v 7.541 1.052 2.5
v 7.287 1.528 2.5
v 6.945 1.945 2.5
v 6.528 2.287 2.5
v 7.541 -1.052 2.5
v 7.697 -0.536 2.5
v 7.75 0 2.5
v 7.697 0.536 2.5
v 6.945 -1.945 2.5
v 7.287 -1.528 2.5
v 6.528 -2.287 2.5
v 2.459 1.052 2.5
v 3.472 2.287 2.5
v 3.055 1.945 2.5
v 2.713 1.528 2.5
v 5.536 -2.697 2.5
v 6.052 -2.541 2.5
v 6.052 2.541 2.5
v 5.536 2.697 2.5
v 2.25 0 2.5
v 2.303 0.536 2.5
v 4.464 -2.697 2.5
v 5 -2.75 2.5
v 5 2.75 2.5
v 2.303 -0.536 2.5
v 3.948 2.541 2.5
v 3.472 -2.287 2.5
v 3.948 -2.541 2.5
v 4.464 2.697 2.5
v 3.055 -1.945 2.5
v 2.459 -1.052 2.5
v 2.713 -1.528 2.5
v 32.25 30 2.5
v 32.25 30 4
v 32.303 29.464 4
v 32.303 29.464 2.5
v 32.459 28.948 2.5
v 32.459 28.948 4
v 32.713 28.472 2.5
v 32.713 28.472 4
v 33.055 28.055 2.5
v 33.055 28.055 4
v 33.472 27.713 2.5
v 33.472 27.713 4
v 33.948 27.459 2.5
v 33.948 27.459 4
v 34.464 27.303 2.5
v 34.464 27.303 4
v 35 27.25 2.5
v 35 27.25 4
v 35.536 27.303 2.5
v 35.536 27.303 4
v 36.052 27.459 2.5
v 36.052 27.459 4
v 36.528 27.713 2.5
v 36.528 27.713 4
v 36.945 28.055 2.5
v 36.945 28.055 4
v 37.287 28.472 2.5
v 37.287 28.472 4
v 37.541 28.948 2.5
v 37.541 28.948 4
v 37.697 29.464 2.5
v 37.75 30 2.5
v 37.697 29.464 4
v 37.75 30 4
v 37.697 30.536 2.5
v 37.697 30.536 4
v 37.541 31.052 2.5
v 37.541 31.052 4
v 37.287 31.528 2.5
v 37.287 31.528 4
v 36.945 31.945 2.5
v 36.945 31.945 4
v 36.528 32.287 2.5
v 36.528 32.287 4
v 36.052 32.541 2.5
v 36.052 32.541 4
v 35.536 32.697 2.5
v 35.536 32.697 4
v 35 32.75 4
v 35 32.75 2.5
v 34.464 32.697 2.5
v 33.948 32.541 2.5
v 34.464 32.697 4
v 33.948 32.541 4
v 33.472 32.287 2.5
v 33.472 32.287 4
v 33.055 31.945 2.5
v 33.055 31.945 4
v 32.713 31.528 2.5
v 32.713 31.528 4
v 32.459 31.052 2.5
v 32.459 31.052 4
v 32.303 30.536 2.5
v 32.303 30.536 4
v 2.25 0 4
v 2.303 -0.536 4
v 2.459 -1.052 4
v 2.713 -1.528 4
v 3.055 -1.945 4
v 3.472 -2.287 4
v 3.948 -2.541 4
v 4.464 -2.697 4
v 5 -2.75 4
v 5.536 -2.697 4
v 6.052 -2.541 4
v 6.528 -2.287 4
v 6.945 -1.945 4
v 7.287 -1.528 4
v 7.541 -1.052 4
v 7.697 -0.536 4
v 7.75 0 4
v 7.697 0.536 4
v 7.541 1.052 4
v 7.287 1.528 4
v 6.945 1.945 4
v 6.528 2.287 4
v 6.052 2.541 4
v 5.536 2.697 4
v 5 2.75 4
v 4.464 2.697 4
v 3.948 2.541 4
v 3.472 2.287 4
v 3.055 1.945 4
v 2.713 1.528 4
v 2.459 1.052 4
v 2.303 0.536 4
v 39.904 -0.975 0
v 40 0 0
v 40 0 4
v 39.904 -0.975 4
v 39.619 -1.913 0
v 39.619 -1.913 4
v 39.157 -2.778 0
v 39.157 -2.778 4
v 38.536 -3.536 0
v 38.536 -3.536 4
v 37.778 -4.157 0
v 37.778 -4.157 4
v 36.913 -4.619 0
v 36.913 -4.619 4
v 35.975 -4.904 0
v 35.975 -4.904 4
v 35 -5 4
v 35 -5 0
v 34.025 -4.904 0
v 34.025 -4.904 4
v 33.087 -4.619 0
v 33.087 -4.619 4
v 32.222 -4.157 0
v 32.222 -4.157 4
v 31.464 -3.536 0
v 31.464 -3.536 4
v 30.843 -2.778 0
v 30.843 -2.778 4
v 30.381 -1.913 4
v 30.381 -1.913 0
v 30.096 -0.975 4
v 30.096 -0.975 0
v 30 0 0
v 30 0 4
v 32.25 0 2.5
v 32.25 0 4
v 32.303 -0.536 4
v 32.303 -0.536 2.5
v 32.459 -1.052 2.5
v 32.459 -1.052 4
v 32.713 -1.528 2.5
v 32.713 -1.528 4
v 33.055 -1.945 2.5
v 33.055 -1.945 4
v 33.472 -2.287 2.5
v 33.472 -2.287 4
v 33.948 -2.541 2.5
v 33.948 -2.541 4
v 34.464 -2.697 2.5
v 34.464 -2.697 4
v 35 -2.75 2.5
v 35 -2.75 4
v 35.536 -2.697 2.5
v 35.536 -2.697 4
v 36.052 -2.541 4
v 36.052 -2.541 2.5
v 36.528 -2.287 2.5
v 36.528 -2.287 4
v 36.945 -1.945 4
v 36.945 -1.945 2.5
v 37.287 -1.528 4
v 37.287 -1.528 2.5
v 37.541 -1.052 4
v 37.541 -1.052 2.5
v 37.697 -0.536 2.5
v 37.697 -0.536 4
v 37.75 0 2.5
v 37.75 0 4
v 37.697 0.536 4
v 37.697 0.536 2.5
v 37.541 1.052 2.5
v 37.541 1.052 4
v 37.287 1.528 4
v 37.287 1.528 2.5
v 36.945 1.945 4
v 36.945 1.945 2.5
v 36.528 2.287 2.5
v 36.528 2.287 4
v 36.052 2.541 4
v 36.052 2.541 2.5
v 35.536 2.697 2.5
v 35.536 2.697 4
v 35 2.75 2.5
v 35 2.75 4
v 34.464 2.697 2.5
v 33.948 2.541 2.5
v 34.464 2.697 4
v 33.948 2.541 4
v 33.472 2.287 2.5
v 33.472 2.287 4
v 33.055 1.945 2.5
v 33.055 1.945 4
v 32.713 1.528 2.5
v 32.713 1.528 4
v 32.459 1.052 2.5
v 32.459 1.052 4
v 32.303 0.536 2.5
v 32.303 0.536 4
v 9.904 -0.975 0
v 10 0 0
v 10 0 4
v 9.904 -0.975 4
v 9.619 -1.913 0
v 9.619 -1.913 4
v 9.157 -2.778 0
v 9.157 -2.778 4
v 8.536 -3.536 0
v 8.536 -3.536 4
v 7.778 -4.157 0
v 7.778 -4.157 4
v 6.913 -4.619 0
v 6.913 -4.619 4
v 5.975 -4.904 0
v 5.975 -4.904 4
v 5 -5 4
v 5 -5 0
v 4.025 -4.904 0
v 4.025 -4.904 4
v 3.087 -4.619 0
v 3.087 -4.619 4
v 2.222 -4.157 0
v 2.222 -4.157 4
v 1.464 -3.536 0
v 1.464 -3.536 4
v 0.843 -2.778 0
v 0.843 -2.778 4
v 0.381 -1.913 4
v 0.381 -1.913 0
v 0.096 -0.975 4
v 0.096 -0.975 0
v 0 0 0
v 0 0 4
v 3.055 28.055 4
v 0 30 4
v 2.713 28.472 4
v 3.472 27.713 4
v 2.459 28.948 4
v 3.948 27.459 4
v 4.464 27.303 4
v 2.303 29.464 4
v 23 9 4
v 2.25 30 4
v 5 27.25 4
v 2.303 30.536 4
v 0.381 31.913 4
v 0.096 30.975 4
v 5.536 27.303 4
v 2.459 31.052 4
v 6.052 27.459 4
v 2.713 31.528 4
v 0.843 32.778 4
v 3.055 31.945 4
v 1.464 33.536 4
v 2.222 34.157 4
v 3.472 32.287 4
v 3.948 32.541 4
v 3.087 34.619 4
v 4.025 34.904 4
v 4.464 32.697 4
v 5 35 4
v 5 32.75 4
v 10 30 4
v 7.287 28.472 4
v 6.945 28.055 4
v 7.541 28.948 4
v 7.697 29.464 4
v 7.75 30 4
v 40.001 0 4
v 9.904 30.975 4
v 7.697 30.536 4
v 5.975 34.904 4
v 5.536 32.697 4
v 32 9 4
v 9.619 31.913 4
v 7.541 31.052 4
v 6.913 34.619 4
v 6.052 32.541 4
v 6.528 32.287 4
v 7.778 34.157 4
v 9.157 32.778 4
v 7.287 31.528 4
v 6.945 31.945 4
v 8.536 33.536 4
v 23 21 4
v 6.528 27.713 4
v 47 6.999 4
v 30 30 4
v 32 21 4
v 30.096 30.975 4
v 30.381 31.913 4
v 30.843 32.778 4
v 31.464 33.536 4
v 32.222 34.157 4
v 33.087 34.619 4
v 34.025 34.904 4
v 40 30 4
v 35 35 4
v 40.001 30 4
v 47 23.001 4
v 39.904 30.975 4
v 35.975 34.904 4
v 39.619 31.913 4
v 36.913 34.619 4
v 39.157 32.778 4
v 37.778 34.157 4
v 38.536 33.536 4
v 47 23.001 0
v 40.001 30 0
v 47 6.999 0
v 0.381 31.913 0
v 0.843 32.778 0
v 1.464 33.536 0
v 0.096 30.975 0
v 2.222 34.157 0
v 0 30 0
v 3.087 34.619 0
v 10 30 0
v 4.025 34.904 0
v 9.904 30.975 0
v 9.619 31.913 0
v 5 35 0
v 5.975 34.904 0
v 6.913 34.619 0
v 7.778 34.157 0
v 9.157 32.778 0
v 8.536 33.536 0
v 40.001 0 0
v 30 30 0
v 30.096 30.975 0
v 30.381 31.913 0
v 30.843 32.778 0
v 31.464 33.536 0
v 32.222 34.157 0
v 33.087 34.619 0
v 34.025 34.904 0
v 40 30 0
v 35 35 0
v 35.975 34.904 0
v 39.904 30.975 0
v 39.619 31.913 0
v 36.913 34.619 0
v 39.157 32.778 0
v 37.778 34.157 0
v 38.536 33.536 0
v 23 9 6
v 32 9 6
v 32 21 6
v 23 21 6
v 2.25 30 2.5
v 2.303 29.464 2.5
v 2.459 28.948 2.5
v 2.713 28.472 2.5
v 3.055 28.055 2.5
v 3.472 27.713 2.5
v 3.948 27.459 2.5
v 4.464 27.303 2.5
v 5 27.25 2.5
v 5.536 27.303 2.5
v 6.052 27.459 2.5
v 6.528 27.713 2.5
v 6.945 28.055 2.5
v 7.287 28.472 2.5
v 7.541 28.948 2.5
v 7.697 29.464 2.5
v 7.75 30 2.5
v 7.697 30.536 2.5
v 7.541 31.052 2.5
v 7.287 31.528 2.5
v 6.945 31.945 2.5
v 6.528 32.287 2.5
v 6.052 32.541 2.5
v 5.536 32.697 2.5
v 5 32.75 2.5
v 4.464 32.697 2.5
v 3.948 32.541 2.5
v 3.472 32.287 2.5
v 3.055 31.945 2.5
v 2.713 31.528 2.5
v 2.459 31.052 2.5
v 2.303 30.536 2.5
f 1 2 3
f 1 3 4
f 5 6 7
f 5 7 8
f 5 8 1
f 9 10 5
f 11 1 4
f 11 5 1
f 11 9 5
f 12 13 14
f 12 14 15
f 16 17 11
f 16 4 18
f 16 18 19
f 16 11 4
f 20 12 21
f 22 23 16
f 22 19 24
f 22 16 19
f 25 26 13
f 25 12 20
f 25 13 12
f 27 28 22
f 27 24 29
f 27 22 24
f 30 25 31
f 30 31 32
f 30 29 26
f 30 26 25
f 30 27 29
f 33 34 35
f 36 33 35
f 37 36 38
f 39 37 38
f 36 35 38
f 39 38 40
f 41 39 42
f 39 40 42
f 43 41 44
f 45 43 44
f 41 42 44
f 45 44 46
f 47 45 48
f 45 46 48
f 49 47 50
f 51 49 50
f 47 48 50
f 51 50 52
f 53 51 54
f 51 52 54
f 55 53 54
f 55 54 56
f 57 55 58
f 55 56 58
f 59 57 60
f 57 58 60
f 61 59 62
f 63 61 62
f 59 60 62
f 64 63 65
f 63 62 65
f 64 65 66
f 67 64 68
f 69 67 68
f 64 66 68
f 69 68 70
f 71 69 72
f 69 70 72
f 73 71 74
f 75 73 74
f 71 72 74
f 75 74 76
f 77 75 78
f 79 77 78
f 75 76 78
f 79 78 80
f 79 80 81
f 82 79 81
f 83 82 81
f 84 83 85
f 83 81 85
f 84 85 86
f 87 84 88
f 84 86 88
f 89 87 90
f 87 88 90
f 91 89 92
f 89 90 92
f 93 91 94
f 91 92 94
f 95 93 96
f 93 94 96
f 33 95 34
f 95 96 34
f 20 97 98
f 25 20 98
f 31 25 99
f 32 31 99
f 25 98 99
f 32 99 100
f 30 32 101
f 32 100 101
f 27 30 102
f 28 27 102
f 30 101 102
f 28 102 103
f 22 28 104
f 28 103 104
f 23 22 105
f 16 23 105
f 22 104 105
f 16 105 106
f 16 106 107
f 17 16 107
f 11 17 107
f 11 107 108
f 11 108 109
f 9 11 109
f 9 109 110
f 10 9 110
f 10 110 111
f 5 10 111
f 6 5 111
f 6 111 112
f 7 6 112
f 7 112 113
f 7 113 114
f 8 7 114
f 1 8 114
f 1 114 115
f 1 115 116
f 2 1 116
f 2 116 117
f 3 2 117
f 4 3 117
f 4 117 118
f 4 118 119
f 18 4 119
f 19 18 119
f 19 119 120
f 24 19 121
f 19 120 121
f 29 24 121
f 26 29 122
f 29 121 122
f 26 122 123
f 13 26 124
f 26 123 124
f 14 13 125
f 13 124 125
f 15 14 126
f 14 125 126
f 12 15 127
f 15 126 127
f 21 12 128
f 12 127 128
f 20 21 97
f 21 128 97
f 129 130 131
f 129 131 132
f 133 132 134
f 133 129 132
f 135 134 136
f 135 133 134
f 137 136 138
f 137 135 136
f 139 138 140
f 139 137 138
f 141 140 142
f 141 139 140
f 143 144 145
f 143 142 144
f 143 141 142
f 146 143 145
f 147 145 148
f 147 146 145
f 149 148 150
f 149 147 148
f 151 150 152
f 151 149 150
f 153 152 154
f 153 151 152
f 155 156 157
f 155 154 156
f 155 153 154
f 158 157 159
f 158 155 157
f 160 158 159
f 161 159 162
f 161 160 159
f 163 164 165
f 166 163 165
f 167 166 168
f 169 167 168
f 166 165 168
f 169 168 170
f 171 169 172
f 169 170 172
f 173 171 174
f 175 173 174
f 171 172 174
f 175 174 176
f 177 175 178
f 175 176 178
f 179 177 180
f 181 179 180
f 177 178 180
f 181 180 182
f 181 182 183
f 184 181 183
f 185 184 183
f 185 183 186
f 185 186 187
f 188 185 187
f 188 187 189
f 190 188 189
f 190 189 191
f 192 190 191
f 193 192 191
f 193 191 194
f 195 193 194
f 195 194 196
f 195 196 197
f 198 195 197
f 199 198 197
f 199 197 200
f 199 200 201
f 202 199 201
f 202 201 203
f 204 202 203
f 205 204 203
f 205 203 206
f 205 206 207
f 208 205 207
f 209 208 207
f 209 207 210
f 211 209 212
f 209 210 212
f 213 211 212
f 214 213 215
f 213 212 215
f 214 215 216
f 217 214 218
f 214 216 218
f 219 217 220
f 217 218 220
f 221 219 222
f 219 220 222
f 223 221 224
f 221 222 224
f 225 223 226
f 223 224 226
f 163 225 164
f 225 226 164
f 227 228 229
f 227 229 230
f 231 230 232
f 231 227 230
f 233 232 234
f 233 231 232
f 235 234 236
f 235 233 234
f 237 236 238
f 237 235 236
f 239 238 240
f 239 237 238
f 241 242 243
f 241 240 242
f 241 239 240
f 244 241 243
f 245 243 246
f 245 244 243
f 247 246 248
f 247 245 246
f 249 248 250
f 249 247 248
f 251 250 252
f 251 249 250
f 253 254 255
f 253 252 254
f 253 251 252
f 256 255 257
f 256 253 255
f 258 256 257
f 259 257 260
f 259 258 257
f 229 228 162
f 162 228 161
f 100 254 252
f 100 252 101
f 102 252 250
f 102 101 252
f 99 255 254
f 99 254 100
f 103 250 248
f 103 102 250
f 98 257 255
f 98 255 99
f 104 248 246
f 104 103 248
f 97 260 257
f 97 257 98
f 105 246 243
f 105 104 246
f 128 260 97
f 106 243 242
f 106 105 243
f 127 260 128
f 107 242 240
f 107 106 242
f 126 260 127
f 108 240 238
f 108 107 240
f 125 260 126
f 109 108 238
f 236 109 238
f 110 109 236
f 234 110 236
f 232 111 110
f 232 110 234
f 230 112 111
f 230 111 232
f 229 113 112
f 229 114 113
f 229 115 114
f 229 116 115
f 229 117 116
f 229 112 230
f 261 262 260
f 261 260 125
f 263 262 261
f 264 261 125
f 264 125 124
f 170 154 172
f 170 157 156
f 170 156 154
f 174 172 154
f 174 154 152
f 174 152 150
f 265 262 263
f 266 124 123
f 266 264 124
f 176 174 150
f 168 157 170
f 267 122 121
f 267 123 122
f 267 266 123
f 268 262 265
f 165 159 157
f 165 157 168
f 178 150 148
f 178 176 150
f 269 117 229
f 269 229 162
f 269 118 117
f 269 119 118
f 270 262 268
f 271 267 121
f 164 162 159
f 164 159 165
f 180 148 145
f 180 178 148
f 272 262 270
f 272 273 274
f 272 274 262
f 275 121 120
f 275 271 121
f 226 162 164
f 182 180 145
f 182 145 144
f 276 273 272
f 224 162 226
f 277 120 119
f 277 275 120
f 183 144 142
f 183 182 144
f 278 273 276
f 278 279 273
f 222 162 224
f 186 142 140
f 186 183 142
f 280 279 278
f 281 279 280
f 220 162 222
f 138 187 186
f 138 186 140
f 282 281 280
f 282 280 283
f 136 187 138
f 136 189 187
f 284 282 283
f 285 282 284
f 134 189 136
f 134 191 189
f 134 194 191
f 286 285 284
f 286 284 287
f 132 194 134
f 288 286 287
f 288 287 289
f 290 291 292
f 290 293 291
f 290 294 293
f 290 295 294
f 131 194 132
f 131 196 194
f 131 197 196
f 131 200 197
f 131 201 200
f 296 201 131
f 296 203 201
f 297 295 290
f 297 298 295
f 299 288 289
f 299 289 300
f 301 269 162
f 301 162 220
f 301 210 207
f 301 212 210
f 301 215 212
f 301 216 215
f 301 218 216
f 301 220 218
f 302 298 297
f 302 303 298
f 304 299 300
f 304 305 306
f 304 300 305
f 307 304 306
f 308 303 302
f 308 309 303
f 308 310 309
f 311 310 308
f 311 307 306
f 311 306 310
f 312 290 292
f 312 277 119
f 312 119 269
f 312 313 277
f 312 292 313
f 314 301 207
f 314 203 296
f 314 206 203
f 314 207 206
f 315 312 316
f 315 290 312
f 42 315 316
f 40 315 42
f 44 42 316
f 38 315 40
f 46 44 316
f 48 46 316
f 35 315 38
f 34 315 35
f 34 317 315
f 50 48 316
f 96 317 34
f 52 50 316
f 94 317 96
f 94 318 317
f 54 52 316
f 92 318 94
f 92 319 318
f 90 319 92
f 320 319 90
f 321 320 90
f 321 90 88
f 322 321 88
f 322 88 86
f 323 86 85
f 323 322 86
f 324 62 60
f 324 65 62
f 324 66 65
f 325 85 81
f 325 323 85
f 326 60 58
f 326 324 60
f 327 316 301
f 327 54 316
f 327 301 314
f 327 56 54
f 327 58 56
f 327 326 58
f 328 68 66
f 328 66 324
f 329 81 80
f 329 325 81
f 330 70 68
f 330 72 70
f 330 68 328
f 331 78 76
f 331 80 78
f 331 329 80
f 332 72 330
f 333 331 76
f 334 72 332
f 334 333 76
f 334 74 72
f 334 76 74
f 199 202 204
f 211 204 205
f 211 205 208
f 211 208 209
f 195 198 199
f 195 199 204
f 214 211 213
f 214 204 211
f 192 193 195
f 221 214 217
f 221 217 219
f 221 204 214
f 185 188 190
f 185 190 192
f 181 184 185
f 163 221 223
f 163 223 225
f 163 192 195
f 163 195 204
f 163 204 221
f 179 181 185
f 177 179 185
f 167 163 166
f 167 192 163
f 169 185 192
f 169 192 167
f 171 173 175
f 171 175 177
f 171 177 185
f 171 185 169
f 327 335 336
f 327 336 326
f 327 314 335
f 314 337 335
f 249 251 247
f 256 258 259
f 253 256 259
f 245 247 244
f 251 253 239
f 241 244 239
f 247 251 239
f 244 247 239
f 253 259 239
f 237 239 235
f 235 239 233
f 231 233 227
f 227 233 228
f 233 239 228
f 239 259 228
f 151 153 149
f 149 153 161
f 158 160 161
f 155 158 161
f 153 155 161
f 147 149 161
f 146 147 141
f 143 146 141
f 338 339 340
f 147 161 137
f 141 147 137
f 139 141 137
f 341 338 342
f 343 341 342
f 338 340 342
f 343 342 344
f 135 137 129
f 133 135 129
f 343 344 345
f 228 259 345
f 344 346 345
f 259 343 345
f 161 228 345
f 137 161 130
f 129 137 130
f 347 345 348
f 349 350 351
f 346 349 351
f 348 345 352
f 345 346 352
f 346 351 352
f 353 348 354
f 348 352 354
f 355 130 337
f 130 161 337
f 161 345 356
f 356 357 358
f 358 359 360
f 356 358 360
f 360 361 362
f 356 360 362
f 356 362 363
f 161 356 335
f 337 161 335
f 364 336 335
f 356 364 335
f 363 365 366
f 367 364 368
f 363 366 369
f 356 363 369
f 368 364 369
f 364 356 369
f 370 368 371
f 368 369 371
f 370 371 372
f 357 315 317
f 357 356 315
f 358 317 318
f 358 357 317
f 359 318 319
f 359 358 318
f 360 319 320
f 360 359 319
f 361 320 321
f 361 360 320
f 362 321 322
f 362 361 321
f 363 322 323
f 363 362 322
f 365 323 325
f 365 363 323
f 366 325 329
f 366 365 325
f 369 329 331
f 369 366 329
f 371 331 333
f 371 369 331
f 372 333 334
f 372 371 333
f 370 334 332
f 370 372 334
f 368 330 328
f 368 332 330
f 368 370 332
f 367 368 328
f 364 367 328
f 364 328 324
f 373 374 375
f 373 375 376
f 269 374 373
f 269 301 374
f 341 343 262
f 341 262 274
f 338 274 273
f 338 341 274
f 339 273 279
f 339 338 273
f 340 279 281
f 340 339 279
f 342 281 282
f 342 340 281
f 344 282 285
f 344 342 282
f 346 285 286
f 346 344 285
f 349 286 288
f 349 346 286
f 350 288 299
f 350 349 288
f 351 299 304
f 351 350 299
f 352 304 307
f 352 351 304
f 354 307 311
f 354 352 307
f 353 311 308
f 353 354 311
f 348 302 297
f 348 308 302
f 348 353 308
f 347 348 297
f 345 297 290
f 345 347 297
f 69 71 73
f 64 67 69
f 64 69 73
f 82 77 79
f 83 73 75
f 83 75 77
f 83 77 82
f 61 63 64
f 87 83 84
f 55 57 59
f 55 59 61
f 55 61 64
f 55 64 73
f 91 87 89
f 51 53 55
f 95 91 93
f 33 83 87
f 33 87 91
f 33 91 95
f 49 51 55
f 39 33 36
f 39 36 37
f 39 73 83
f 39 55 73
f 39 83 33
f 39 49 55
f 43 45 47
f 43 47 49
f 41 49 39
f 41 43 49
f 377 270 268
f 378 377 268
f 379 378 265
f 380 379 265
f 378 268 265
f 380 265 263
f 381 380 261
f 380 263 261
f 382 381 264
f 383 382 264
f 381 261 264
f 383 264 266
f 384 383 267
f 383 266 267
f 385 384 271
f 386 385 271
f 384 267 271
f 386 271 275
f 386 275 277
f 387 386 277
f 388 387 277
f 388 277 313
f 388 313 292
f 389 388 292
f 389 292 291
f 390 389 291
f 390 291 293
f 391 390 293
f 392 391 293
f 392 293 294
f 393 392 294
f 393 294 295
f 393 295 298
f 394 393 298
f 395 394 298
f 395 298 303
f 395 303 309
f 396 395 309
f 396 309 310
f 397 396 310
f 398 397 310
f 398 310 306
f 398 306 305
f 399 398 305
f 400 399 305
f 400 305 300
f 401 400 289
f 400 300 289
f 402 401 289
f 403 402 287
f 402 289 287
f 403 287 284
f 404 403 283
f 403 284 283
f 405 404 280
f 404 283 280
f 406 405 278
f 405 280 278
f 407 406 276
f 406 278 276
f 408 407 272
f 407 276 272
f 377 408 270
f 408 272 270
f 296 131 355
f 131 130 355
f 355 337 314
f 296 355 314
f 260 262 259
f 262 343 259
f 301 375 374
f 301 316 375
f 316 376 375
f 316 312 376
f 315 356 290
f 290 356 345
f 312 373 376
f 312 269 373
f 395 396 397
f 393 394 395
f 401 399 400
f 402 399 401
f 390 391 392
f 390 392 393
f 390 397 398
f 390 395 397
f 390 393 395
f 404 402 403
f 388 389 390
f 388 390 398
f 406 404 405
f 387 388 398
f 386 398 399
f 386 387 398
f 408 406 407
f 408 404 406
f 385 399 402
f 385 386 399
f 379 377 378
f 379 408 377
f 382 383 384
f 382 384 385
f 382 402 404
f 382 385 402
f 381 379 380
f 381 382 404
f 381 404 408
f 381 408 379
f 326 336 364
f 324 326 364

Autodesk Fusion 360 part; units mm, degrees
sketch "Colour Sensor Cover" plane through (0, 0, 0) normal (0, 0, 1) x (1, 0, 0)
  line L0 (0, 0) -> (47, 0)
  line L1 (47, 0) -> (47, 30)
  line L2 (47, 30) -> (0, 30)
  line L3 (0, 30) -> (0, 0)
  circle A0 centre (5, 30) radius 5
  circle A1 centre (35, 30) radius 5
  circle A2 centre (5, 0) radius 5
  circle A3 centre (35, 0) radius 5
  dimension "d1" = 47
  dimension "d2" = 30
  dimension "d3" = 10
  dimension "d4" = 10
  dimension "d5" = 10
  dimension "d6" = 10
  dimension "d7" = 5
  dimension "d8" = 5
  dimension "d9" = 12
  dimension "d10" = 12
extrude "Extrude1" add sketch "Colour Sensor Cover" along normal blind 4
chamfer "Chamfer1" distance 7 angle 45 2 edges at (47, 0, 2) (47, 30, 2)
sketch "Magnet Holes" plane through (0, 0, 4) normal (0, 0, 1) x (-1, 0, 0)
  line L0 (-47, -23) -> (-40, -30)
  arc A0 (-40, -30) -> (-30, -30) centre (-35, -30) ccw
  line L1 (-30, -30) -> (-10, -30)
  arc A1 (-10, -30) -> (0, -30) centre (-5, -30) ccw
  line L2 (0, -30) -> (0, 0)
  arc A2 (0, 0) -> (-10, 0) centre (-5, 0) ccw
  line L3 (-10, 0) -> (-30, 0)
  arc A3 (-30, 0) -> (-40, 0) centre (-35, 0) ccw
  line L4 (-40, 0) -> (-47, -7)
  line L5 (-47, -7) -> (-47, -23)
  circle A4 centre (-5, -30) radius 2.75
  circle A5 centre (-35, -30) radius 2.75
  circle A6 centre (-5, 0) radius 2.75
  circle A7 centre (-35, 0) radius 2.75
  dimension "d14" = 5.5
  dimension "d15" = 5.5
  dimension "d16" = 5.5
  dimension "d17" = 5.5
extrude "Extrude2" cut sketch "Magnet Holes" against normal blind 1.5 contours A4 | A5 | A6 | A7
sketch "Colour Sensor Support" plane through (0, 0, 4) normal (0, 0, 1) x (-1, 0, 0)
  circle A0 centre (-5, -30) radius 2.75
  circle A1 centre (-35, -30) radius 2.75
  circle A2 centre (-5, 0) radius 2.75
  circle A3 centre (-35, 0) radius 2.75
  line L0 (-47, -23) -> (-40, -30)
  arc A4 (-40, -30) -> (-30, -30) centre (-35, -30) ccw
  line L1 (-30, -30) -> (-10, -30)
  arc A5 (-10, -30) -> (0, -30) centre (-5, -30) ccw
  line L2 (0, -30) -> (0, 0)
  arc A6 (0, 0) -> (-10, 0) centre (-5, 0) ccw
  line L3 (-10, 0) -> (-30, 0)
  arc A7 (-30, 0) -> (-40, 0) centre (-35, 0) ccw
  line L4 (-40, 0) -> (-47, -7)
  line L5 (-47, -7) -> (-47, -23)
  line L6 (-23, -21) -> (-32, -21)
  line L7 (-32, -21) -> (-32, -9)
  line L8 (-32, -9) -> (-23, -9)
  line L9 (-23, -9) -> (-23, -21)
  dimension "d20" = 9
  dimension "d21" = 9
  dimension "d22" = 15
  dimension "d23" = 9
  dimension "d24" = 12
extrude "Extrude3" add sketch "Colour Sensor Support" along normal blind 2 contours L6 L7 L8 L9
equation "d9 = 7 mm + 5 mm"
equation "d10 = 7 mm + 5 mm"
